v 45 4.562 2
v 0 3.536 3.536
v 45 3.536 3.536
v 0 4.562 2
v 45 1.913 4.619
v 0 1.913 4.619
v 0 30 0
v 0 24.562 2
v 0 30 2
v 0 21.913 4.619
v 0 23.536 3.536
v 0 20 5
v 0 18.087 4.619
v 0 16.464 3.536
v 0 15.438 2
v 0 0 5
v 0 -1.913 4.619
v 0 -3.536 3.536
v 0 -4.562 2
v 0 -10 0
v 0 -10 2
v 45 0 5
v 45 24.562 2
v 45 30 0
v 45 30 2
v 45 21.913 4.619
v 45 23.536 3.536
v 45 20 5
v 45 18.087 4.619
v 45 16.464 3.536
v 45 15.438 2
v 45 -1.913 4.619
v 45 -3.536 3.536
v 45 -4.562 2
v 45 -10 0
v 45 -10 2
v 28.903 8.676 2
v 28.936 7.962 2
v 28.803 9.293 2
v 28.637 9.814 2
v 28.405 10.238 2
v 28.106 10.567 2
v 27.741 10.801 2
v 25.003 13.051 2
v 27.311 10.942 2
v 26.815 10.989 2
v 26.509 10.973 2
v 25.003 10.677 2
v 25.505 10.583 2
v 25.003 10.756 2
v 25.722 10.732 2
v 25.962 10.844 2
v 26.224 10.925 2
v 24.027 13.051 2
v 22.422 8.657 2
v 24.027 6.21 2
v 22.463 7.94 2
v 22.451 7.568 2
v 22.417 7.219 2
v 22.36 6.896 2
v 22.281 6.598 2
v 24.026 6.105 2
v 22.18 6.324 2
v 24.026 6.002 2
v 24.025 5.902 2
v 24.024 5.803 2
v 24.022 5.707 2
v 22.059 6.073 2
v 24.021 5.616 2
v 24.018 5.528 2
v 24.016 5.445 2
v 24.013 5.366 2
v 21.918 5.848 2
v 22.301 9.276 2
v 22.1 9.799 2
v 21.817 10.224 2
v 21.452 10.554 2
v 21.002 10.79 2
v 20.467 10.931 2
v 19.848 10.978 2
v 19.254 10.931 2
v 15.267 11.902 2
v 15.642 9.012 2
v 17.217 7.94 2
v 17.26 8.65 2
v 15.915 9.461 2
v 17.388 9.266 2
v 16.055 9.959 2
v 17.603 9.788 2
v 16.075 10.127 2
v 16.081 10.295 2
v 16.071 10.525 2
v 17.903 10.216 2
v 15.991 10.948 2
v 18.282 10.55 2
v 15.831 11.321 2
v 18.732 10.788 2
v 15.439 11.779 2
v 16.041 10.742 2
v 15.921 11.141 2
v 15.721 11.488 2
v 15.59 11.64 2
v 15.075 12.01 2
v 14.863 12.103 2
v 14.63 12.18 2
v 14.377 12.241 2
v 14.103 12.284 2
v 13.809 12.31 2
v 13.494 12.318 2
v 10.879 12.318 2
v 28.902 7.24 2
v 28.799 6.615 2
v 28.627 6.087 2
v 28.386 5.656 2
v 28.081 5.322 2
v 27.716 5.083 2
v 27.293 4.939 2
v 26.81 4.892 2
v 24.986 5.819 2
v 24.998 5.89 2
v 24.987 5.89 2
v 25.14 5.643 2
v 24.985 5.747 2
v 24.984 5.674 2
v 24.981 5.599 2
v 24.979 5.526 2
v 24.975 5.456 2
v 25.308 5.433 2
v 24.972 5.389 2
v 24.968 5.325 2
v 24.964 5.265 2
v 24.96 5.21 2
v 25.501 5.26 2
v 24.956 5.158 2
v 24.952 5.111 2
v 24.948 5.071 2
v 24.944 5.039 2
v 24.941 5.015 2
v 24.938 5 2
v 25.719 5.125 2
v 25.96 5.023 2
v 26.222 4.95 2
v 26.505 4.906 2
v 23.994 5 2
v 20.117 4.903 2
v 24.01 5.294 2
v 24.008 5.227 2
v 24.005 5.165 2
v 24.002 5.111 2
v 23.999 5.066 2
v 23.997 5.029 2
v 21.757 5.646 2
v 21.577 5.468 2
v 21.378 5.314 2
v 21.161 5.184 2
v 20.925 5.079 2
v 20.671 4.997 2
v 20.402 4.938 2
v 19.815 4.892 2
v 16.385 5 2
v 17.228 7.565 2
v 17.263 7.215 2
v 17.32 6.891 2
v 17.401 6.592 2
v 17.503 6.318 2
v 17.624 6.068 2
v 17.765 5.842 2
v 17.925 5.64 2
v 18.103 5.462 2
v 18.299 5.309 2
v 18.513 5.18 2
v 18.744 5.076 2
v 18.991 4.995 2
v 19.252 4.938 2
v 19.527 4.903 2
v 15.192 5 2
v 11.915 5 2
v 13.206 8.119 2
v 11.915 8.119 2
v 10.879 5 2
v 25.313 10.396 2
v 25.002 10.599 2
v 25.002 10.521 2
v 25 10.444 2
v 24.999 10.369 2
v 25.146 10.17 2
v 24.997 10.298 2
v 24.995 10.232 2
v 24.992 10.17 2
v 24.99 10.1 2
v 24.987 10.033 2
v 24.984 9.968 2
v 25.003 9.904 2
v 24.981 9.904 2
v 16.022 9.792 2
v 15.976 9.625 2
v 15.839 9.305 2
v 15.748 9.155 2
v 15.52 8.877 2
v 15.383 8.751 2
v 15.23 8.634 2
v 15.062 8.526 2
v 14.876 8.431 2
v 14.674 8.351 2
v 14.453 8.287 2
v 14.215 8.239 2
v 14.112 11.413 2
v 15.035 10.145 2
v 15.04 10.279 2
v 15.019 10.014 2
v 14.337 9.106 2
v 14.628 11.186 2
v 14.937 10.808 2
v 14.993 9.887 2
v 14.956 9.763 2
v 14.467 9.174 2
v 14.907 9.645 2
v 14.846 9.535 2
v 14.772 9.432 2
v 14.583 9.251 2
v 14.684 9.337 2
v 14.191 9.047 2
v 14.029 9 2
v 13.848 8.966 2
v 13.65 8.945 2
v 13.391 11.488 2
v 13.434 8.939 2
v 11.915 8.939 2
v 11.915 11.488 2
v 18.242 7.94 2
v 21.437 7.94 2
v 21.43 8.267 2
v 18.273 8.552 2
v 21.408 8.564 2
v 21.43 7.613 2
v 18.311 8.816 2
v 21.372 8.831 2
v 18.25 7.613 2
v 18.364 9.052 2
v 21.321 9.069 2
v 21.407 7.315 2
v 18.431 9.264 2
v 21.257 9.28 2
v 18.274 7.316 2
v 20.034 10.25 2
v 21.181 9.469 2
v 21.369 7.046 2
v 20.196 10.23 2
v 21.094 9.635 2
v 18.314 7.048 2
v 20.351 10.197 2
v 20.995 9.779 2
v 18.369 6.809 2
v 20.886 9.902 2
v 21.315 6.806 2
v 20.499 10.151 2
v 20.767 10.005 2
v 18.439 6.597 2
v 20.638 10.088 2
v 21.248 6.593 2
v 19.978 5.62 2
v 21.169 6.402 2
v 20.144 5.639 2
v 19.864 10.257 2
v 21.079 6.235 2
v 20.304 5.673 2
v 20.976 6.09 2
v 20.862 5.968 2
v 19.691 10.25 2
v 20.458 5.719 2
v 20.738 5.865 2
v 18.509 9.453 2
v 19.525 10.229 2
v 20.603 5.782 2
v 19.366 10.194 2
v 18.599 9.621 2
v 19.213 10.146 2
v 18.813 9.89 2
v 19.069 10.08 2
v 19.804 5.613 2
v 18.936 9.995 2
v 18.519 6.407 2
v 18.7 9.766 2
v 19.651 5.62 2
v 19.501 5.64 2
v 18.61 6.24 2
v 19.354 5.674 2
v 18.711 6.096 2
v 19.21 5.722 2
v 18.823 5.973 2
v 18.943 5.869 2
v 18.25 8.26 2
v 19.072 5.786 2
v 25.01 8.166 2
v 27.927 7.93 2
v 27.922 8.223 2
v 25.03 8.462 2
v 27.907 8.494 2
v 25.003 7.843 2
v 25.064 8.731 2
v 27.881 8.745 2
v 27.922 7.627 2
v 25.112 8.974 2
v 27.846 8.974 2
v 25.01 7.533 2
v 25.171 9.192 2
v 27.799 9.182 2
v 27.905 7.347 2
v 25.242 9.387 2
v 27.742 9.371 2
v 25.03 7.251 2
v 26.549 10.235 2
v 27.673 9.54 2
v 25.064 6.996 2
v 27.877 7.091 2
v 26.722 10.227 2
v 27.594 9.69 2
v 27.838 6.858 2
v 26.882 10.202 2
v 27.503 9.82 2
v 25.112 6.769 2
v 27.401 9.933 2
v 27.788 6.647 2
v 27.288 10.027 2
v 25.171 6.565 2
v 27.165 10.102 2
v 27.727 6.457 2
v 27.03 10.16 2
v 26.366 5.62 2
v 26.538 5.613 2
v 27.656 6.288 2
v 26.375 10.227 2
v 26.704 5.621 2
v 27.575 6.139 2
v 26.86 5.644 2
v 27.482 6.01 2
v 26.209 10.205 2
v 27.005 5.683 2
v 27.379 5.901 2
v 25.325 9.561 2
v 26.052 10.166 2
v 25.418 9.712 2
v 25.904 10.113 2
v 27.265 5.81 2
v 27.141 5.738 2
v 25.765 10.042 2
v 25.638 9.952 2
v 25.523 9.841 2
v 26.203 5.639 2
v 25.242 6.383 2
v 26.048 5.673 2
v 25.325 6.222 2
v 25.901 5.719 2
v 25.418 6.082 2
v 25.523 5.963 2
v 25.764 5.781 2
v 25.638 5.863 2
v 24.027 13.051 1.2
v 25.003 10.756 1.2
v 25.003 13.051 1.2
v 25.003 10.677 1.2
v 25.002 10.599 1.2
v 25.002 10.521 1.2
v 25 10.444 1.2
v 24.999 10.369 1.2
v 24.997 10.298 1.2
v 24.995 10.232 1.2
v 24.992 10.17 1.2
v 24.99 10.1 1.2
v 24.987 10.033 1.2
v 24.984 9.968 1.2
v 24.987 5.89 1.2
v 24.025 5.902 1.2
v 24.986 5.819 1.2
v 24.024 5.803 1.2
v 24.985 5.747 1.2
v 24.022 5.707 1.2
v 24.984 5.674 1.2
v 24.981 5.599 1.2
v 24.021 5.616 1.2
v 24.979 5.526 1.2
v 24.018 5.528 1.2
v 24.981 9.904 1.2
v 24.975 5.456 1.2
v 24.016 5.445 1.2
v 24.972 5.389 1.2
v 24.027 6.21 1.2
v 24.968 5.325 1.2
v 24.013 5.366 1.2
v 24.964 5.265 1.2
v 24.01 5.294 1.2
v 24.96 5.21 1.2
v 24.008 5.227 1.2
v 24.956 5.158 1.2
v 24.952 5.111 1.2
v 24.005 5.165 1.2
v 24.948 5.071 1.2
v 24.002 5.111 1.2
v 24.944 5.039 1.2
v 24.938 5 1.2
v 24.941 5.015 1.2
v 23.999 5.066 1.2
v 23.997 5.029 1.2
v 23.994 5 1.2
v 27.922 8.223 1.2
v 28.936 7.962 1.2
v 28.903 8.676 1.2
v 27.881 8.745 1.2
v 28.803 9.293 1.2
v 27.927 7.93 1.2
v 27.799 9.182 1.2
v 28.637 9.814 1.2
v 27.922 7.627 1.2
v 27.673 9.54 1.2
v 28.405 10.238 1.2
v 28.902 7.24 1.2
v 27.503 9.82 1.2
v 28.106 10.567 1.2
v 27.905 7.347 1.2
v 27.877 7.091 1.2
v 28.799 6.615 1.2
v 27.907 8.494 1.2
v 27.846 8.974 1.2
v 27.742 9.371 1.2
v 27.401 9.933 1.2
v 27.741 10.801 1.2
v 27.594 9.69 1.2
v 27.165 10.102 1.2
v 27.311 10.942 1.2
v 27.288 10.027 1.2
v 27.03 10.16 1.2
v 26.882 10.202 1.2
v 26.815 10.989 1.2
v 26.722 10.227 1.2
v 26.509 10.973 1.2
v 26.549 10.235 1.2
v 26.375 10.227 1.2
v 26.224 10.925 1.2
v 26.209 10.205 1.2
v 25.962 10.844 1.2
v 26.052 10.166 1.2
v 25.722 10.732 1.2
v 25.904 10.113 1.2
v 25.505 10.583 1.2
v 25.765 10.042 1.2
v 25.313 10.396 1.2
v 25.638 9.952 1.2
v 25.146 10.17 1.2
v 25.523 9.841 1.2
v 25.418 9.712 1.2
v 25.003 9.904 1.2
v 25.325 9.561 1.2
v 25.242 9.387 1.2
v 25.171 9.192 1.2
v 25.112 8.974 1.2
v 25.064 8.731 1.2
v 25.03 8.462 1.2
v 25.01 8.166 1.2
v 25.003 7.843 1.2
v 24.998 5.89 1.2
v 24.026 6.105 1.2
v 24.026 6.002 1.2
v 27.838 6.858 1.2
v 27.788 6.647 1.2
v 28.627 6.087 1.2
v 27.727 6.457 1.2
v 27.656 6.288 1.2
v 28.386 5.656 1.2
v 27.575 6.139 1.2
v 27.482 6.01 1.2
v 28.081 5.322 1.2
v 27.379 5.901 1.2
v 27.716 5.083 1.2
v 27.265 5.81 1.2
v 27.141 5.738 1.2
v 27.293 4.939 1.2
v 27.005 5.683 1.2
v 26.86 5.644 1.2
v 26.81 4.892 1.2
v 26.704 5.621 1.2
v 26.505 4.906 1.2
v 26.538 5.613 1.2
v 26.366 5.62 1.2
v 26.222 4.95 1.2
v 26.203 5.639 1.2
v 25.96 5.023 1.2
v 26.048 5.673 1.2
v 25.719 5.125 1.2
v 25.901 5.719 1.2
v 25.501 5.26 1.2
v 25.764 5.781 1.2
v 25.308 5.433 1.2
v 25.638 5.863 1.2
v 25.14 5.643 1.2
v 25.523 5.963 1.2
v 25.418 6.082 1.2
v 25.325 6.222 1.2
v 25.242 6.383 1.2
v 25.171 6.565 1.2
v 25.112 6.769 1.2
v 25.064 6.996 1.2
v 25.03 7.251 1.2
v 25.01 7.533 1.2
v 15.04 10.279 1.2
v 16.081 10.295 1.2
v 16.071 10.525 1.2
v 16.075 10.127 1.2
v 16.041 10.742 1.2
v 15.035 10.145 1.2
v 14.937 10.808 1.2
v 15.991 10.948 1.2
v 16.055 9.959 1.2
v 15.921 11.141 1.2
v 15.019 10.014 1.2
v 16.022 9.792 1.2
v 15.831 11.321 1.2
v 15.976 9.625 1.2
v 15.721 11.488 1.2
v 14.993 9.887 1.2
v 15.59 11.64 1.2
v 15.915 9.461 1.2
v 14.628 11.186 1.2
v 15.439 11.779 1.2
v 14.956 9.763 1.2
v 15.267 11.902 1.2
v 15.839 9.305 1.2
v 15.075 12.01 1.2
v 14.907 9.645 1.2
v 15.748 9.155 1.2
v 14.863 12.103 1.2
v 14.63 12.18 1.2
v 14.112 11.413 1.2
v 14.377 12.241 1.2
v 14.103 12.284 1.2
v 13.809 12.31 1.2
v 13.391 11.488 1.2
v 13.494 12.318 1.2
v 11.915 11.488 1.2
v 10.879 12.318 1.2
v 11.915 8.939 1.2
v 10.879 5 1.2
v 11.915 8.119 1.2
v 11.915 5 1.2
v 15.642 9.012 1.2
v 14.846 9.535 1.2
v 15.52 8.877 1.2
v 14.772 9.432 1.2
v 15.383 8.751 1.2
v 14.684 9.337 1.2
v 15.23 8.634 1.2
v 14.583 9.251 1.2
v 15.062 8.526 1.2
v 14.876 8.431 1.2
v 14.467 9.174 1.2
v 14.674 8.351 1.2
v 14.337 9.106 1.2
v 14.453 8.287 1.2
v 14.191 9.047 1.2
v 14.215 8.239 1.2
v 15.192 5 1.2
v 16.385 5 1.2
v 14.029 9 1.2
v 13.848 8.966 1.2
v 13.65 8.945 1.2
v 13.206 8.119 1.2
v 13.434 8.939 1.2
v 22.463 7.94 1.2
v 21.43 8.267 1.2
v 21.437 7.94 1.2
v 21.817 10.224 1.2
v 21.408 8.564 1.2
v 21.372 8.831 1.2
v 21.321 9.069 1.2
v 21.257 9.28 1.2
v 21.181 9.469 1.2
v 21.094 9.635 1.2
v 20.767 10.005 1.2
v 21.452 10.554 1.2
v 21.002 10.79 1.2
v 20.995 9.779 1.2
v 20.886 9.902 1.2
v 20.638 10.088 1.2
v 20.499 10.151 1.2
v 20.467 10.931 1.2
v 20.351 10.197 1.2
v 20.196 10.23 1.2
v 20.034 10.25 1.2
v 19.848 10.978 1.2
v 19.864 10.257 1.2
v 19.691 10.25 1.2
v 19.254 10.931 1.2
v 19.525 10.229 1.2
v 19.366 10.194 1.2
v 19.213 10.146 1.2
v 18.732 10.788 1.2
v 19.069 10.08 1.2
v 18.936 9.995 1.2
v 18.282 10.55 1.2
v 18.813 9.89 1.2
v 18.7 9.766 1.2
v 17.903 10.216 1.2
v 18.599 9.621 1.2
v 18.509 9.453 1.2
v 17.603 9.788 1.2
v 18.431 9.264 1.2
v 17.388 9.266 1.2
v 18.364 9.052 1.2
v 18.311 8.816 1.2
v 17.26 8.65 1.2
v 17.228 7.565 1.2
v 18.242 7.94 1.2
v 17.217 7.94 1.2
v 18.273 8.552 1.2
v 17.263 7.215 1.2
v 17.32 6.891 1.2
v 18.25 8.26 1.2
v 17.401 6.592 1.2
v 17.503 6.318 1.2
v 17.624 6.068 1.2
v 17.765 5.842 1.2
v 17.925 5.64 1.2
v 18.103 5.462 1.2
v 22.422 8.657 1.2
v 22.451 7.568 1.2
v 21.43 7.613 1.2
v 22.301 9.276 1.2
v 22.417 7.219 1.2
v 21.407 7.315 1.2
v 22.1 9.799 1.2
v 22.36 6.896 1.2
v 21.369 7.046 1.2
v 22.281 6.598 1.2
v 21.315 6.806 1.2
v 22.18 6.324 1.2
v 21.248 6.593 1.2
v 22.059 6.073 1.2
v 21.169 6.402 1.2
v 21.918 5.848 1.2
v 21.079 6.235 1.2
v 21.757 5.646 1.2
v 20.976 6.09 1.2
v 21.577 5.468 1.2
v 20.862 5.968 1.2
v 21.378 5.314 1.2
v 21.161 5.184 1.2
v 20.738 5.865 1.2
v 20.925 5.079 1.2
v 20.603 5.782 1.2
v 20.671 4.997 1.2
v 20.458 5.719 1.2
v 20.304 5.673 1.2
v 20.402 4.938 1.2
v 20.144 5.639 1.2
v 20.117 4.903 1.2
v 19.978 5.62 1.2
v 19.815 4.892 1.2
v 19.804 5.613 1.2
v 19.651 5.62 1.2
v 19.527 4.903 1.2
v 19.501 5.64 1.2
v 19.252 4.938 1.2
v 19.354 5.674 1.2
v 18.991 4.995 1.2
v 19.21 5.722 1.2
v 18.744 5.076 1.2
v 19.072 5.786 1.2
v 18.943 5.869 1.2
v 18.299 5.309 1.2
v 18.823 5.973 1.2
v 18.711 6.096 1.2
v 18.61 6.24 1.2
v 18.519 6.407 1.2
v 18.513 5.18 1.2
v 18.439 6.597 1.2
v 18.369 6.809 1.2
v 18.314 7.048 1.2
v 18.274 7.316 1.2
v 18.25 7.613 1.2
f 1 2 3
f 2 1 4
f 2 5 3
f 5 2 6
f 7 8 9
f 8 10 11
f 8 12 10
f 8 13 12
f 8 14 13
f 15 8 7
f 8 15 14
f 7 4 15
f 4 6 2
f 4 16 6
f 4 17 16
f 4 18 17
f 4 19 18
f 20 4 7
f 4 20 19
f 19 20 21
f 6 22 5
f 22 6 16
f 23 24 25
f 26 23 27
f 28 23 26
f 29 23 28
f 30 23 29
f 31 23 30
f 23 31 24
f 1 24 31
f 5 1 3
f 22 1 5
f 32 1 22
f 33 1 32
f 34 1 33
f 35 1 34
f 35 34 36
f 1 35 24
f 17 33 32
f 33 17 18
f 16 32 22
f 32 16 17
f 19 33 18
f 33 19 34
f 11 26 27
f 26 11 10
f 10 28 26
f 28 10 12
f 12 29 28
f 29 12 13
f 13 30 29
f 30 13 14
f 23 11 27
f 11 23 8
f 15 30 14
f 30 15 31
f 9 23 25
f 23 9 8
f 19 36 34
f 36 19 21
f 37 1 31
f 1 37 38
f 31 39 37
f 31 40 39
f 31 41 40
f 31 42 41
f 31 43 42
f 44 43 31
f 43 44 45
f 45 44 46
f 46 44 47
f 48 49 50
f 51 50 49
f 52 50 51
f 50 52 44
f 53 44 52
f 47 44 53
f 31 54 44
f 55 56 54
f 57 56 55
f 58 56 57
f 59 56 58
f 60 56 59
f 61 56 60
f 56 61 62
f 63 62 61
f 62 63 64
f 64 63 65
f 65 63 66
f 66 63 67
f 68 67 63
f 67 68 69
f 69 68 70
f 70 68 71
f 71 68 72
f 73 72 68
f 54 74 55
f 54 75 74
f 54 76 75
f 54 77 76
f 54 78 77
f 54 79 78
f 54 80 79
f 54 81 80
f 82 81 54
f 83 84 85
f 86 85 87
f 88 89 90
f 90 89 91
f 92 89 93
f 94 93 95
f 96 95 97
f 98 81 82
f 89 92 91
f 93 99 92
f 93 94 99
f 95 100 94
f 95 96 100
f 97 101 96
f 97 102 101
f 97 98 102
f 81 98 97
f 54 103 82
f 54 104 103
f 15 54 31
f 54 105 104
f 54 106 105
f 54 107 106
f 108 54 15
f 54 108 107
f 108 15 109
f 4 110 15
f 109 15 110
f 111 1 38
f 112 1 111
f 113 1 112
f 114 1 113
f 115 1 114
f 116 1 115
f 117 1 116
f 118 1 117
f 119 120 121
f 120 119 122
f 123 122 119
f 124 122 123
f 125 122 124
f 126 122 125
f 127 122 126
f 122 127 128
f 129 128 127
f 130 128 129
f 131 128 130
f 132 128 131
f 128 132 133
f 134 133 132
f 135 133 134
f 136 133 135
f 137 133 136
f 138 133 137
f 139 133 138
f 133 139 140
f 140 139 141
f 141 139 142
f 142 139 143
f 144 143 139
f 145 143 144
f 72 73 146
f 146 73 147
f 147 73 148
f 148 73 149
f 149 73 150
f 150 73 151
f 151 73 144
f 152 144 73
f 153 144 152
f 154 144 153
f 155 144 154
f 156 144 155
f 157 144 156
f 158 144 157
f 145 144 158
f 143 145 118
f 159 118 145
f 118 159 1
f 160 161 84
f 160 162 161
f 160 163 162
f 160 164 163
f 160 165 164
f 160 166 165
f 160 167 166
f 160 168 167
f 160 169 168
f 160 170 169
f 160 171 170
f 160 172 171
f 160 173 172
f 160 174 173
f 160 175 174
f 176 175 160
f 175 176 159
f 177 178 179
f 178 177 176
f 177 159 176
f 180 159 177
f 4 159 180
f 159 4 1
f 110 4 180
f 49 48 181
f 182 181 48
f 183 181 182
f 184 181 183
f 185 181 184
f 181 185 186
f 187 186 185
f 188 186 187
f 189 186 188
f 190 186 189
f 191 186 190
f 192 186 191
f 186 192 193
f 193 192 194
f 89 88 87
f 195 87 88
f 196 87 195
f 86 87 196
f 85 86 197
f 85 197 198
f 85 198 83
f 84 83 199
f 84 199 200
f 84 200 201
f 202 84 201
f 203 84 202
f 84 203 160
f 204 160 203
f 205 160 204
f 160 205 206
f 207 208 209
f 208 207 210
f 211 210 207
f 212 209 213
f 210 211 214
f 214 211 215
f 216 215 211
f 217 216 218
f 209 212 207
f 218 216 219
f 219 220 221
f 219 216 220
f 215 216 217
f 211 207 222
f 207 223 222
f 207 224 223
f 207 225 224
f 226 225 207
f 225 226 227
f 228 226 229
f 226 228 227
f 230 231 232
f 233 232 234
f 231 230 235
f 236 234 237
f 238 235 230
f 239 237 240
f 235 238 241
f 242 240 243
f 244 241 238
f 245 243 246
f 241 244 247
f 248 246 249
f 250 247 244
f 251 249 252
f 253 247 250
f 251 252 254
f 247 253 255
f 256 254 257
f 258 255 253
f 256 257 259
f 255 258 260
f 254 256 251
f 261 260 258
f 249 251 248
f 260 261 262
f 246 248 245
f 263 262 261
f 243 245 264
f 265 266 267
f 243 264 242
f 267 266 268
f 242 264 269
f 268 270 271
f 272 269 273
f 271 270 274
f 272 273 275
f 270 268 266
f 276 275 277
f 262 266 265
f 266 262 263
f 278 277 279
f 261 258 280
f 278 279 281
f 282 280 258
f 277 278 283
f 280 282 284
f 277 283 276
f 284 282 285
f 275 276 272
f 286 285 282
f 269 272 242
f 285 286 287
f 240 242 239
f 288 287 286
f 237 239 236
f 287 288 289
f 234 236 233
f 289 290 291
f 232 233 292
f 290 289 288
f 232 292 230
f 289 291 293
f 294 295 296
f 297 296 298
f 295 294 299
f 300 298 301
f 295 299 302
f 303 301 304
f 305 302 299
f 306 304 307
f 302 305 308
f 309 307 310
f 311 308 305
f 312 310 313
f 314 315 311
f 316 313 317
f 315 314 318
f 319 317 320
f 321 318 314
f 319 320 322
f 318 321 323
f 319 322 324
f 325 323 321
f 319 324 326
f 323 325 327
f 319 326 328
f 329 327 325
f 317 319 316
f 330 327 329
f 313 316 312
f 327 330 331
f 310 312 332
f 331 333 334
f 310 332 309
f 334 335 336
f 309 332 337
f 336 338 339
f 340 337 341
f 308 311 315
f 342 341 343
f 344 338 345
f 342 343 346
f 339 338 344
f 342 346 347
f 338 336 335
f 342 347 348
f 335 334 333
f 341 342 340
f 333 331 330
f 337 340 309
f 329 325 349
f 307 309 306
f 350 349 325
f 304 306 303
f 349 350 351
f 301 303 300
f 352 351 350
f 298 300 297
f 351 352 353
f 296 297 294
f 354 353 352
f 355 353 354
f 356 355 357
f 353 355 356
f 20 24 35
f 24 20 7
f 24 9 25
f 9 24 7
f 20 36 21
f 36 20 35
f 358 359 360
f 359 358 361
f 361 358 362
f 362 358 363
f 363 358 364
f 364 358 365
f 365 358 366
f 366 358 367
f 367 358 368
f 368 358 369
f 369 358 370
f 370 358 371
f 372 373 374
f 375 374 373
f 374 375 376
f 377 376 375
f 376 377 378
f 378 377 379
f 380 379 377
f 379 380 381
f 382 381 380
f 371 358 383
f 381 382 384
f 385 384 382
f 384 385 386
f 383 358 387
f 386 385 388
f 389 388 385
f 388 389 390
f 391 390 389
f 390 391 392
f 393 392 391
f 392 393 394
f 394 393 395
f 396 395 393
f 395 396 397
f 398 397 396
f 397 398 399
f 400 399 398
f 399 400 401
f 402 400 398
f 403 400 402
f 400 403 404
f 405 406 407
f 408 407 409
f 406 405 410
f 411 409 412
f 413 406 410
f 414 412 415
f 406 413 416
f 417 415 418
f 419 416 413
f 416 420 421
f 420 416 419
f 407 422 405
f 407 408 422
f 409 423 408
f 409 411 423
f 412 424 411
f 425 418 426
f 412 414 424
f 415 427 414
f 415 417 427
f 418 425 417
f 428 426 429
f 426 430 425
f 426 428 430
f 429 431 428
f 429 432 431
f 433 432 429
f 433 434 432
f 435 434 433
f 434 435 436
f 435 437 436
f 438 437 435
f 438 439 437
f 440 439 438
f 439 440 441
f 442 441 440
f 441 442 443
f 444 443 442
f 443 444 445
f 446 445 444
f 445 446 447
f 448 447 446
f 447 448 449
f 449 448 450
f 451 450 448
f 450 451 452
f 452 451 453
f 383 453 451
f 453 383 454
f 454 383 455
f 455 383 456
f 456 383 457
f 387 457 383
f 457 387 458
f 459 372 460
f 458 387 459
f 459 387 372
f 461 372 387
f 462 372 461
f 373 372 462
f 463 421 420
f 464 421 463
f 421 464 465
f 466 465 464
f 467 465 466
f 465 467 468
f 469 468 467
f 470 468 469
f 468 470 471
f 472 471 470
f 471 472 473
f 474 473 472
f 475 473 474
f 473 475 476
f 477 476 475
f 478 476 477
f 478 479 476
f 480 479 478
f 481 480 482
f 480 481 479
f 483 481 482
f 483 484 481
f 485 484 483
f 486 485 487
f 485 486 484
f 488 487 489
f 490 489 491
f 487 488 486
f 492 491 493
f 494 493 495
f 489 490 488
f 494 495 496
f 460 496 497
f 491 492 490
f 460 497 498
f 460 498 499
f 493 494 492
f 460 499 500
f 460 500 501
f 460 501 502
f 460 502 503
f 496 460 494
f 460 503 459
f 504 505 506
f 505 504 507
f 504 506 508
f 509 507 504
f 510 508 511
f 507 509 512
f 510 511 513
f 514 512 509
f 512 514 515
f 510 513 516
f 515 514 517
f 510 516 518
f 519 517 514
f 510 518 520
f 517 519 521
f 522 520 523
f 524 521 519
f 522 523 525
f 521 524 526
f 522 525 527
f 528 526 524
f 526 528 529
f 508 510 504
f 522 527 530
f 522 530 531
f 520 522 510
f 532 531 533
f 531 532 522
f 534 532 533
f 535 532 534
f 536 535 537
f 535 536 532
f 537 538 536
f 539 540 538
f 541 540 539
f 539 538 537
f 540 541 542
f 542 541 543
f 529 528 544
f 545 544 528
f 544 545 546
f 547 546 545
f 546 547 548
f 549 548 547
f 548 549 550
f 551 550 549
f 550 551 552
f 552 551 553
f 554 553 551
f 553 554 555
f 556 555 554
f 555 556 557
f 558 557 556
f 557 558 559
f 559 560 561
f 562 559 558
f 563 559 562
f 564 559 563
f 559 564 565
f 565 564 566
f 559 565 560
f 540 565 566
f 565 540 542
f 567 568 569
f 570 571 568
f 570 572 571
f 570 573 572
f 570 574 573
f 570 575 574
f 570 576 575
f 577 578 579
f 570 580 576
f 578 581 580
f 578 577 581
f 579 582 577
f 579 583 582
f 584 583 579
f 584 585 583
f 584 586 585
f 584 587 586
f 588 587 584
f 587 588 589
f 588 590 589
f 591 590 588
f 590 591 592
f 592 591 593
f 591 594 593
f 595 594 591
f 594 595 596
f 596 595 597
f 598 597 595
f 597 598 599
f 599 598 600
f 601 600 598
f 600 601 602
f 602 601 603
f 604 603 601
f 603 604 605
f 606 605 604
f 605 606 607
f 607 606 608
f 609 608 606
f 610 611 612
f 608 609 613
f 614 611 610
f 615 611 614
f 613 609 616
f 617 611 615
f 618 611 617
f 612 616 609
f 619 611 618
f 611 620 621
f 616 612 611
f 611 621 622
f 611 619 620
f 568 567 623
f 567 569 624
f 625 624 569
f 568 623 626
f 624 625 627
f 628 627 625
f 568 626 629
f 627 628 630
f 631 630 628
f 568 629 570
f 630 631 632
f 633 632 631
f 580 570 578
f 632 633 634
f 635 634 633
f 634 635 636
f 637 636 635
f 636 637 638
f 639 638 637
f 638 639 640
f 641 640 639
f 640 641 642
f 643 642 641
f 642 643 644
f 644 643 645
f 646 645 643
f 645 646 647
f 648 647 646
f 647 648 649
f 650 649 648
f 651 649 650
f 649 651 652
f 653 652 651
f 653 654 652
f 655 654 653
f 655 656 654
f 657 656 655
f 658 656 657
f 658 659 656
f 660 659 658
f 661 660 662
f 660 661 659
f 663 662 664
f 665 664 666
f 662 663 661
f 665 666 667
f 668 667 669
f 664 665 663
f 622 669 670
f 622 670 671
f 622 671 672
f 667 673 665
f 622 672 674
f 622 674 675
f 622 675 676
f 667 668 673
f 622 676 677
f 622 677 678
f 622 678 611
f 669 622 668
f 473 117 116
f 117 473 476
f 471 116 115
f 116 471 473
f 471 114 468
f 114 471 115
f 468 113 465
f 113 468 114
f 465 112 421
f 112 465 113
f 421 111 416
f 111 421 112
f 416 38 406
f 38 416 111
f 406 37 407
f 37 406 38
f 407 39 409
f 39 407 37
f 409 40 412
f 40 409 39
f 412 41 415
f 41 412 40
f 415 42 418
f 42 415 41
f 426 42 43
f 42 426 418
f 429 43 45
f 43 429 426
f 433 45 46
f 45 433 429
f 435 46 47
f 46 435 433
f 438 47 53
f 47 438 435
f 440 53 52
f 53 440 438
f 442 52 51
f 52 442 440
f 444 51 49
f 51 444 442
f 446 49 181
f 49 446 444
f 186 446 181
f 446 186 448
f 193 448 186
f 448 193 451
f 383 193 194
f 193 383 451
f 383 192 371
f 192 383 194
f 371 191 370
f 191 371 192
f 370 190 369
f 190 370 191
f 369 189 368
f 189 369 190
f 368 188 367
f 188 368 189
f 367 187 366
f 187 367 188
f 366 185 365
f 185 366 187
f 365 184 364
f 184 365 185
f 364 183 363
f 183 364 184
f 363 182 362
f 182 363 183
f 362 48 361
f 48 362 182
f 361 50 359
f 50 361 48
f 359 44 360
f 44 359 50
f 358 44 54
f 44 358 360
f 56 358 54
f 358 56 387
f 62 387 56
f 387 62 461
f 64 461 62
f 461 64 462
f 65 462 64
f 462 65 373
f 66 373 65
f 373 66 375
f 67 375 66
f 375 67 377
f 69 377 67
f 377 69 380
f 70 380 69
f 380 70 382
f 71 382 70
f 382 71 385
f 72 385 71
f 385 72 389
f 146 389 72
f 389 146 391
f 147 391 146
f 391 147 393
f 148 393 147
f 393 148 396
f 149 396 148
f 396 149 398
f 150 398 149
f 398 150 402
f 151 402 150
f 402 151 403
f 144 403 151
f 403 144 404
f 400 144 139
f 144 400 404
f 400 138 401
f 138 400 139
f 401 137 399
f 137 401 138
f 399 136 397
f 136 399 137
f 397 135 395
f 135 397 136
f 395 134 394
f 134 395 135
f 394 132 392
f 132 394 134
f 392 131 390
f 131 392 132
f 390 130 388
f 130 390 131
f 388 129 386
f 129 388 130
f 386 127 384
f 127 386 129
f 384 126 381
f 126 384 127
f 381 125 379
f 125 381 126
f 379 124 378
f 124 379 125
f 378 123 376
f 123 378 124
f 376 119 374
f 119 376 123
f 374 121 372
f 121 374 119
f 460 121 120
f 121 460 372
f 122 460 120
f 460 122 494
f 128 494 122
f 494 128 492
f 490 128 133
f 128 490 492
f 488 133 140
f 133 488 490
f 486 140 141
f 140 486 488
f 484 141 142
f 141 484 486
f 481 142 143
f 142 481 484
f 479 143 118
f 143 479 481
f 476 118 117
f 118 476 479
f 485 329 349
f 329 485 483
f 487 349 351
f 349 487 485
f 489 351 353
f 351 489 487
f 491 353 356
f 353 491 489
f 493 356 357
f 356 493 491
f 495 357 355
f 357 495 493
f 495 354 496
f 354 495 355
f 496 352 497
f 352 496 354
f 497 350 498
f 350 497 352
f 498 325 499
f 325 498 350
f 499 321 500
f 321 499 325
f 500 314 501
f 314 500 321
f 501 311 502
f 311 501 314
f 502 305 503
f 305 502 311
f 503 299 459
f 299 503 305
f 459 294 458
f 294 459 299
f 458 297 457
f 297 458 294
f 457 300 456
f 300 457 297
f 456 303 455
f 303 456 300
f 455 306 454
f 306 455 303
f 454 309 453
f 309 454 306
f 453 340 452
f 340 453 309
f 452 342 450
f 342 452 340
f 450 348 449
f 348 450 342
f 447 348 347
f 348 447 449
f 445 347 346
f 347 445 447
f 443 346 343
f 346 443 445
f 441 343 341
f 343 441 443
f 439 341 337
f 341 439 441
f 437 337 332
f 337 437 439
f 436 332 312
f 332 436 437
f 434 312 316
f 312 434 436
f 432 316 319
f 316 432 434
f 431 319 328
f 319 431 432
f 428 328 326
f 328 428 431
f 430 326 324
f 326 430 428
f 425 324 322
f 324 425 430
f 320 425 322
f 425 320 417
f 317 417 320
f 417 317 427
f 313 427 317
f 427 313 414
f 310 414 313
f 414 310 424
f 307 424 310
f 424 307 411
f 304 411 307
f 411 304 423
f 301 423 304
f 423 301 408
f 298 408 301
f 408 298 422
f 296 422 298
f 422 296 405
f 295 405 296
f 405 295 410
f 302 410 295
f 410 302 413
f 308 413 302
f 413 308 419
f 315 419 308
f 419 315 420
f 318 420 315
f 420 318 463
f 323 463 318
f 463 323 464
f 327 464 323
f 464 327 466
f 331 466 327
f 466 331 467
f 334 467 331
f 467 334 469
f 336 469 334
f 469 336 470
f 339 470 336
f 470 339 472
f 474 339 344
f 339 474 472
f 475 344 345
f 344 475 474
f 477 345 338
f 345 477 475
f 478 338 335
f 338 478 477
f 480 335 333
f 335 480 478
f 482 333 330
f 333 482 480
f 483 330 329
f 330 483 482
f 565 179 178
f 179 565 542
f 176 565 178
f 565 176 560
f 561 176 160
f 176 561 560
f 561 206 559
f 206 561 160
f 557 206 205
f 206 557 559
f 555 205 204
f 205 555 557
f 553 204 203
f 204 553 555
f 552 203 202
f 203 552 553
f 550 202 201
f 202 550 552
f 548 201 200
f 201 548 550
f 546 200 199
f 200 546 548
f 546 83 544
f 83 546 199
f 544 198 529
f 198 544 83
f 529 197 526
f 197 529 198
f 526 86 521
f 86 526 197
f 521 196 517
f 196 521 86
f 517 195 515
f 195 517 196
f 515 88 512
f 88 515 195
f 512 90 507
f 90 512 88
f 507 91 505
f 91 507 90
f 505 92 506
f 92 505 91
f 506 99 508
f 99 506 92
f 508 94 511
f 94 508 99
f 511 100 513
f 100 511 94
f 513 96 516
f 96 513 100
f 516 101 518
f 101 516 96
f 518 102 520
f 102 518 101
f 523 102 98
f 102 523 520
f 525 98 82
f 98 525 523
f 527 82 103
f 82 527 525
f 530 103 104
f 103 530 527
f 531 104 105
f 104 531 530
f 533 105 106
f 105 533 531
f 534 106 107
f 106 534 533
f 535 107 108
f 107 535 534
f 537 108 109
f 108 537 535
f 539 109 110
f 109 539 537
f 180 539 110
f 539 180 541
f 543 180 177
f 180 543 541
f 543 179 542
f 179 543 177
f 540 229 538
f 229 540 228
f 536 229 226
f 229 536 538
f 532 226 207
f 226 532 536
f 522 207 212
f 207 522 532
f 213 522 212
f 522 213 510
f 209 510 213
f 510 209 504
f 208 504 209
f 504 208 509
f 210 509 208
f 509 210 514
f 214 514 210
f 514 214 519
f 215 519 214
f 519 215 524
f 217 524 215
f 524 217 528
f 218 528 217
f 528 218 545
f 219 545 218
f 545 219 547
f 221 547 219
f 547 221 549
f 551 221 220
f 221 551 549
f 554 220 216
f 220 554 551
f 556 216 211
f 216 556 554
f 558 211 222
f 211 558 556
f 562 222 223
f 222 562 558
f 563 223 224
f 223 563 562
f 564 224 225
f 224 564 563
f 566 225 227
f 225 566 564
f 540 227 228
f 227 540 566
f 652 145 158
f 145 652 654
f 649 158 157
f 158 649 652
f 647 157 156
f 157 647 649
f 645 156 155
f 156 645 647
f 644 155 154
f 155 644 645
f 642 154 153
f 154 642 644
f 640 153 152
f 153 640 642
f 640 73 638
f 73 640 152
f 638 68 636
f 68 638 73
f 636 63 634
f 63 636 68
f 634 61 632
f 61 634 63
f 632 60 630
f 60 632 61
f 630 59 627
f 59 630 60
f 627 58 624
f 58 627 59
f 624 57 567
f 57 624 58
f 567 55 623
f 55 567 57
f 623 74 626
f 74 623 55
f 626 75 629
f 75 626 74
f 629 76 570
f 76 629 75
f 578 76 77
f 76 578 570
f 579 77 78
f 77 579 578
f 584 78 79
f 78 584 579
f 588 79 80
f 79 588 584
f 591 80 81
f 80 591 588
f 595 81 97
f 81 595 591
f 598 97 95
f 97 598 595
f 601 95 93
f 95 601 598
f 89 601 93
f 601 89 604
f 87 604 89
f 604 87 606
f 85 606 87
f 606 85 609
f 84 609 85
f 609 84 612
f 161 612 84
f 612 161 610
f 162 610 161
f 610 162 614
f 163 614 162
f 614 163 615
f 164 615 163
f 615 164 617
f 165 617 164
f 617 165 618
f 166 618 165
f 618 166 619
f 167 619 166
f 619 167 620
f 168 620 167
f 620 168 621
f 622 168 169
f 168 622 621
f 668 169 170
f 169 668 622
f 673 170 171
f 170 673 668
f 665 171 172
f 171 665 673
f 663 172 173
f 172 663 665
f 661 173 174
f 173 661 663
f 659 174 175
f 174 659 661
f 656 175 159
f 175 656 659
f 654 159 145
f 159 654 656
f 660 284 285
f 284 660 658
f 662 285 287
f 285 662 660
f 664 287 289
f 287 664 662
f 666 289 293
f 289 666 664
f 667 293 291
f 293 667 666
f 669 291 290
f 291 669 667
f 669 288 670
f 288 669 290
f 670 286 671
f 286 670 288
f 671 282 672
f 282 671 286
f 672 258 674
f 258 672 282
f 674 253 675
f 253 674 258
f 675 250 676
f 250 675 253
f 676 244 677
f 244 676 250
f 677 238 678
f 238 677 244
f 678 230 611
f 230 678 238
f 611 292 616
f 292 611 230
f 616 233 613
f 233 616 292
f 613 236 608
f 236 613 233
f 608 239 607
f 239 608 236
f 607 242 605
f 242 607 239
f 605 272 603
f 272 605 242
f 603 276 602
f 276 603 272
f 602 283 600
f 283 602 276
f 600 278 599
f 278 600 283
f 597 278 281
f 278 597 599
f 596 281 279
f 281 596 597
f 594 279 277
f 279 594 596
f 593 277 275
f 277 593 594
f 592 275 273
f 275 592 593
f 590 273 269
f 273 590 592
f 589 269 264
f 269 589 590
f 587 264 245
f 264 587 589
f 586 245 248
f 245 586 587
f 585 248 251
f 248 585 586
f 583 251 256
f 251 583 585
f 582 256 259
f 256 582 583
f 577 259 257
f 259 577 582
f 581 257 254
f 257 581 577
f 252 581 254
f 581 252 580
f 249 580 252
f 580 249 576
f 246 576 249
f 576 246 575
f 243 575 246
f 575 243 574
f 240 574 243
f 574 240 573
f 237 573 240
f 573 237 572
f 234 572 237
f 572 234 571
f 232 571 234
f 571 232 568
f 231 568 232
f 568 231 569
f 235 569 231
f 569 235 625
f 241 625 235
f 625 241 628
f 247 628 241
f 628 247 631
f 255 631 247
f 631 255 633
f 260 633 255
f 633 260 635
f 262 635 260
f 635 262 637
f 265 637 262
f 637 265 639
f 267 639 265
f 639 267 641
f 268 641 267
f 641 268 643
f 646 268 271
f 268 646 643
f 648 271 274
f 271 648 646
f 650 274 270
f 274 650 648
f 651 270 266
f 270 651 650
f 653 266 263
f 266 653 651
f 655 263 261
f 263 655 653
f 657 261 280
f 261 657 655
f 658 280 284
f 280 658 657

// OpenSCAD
// sine(x) = O/ H
// x = asin(0/H)
//partialFoot=1200;
//height=10;
//angle=-1*asin(height/partialFoot);

difference() {
  union() {
    rotate([0, 90, 0])
    cylinder(h=45, r=5);

    translate([0, 20, 0])
    rotate([0, 90, 0])
    cylinder(h=45, r=5);
    
    translate([0, -10, 0])
    cube([45, 40, 2]);
  };

  // cut bottom off   
  translate([-1, -15, -10])
  cube([50, 50, 10]);


  translate([10, 5, 1.2])
  linear_extrude(height=2)
  text("Rob", 8, "Courier");
}
